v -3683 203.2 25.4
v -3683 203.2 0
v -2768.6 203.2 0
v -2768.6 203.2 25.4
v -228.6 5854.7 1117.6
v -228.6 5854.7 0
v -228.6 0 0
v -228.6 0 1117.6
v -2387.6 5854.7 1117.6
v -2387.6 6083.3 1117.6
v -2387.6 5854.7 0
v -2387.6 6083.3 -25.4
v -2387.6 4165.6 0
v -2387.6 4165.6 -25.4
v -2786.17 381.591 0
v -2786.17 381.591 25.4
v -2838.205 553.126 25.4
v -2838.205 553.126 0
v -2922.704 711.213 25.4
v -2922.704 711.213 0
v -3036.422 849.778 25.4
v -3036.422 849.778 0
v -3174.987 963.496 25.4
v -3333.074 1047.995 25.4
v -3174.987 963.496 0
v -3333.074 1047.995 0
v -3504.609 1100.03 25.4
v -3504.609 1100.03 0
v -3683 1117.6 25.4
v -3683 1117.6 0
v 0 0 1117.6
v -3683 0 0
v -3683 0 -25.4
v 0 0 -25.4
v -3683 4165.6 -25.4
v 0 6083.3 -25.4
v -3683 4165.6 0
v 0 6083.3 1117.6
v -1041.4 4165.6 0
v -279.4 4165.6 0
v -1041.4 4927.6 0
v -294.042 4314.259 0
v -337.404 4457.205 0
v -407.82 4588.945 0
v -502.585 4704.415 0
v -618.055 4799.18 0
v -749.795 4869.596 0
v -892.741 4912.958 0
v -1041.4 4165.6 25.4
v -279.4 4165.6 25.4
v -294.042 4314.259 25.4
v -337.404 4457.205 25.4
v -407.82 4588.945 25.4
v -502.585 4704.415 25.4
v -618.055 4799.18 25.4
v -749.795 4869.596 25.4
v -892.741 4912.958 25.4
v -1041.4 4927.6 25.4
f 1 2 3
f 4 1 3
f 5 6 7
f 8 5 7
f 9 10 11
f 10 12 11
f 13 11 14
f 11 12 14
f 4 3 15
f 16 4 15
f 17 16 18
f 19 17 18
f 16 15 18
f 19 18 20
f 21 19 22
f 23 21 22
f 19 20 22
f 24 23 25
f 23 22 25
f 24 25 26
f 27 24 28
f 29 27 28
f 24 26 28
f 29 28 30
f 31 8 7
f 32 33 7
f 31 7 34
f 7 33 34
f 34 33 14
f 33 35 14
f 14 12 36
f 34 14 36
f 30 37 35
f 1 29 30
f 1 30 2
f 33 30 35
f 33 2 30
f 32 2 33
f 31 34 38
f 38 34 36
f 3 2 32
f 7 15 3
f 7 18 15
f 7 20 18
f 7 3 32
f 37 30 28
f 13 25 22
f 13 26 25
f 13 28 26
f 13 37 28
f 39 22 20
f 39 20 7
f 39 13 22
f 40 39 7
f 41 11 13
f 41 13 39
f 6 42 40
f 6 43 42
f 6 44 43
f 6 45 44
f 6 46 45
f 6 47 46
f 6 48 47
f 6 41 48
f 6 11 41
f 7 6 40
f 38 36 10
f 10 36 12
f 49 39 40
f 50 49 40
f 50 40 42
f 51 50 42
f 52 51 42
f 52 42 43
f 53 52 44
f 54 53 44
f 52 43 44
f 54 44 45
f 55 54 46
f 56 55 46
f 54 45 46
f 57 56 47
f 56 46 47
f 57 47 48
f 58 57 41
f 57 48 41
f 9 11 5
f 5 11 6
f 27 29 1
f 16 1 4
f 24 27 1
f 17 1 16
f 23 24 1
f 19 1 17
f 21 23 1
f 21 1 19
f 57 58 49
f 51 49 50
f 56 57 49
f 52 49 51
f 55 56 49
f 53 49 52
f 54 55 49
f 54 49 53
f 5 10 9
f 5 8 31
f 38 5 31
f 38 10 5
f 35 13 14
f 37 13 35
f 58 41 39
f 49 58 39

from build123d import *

# Parameters (mm, degrees)
F0_W     = 228.6
F0_H     = 4165.6
F0_W_2   = 279.4
F0_H_2   = 1689.1
F1_DEPTH = 25.4
F2_DEPTH = 25.4
F3_DEPTH = 1117.6


# Not quite as in the source:
# - the program builds the solid bodies; features that only make, move or delete a surface that nothing else refers to are left out


with BuildPart() as f1:
    # F0 (on Top) → F1 (new body)
    with BuildSketch(Plane.XY):
        with BuildLine():
            Line((-3683, 0), (-228.6, 0))
            Line((-228.6, 0), (-228.6, 4165.6))
            Line((-228.6, 4165.6), (-279.4, 4165.6))
            Line((-279.4, 4165.6), (-1041.4, 4165.6))
            Line((-1041.4, 4165.6), (-2108.2, 4165.6))
            Line((-2108.2, 4165.6), (-2387.6, 4165.6))
            Line((-2387.6, 4165.6), (-3683, 4165.6))
            Line((-3683, 4165.6), (-3683, 1117.6))
            ThreePointArc((-3683, 1117.6), (-3036.421559283, 849.778440717), (-2768.6, 203.2))
            Line((-2768.6, 203.2), (-3683, 203.2))
            Line((-3683, 203.2), (-3683, 0))
        make_face()
        with BuildLine():
            Line((-3683, 1117.6), (-3683, 203.2))
            Line((-3683, 203.2), (-2768.6, 203.2))
            ThreePointArc((-2768.6, 203.2), (-3036.421559283, 849.778440717), (-3683, 1117.6))
        make_face()
        with Locations((-114.3, 2082.8)):
            Rectangle(F0_W, F0_H)
        Polygon((-228.6, 4165.6), (0, 4165.6), (0, 6083.3), (-228.6, 6083.3), (-228.6, 5854.7), align=None)
        with BuildLine():
            Line((-279.4, 4165.6), (-228.6, 4165.6))
            Line((-228.6, 4165.6), (-228.6, 5854.7))
            Line((-228.6, 5854.7), (-2108.2, 5854.7))
            Line((-2108.2, 5854.7), (-2108.2, 4165.6))
            Line((-2108.2, 4165.6), (-1041.4, 4165.6))
            Line((-1041.4, 4165.6), (-1041.4, 4927.6))
            ThreePointArc((-1041.4, 4927.6), (-502.5846327359, 4704.4153672641), (-279.4, 4165.6))
        make_face()
        with BuildLine():
            Line((-1041.4, 4165.6), (-279.4, 4165.6))
            ThreePointArc((-279.4, 4165.6), (-502.5846327359, 4704.4153672641), (-1041.4, 4927.6))
            Line((-1041.4, 4927.6), (-1041.4, 4165.6))
        make_face()
        Polygon((-2108.2, 5854.7), (-228.6, 5854.7), (-228.6, 6083.3), (-2387.6, 6083.3), (-2387.6, 5854.7), align=None)
        with Locations((-2247.9, 5010.15)):
            Rectangle(F0_W_2, F0_H_2)
    extrude(amount=-F1_DEPTH)

    # F0 (on Top) → F2 (join)
    with BuildSketch(Plane.XY):
        with BuildLine():
            Line((-3683, 1117.6), (-3683, 203.2))
            Line((-3683, 203.2), (-2768.6, 203.2))
            ThreePointArc((-2768.6, 203.2), (-3036.421559283, 849.778440717), (-3683, 1117.6))
        make_face()
        with BuildLine():
            Line((-1041.4, 4165.6), (-279.4, 4165.6))
            ThreePointArc((-279.4, 4165.6), (-502.5846327359, 4704.4153672641), (-1041.4, 4927.6))
            Line((-1041.4, 4927.6), (-1041.4, 4165.6))
        make_face()
    extrude(amount=F2_DEPTH)

    # F0 (on Top) → F3 (join)
    with BuildSketch(Plane.XY):
        Polygon((-228.6, 4165.6), (0, 4165.6), (0, 6083.3), (-228.6, 6083.3), (-228.6, 5854.7), align=None)
        with Locations((-114.3, 2082.8)):
            Rectangle(F0_W, F0_H)
        Polygon((-2108.2, 5854.7), (-228.6, 5854.7), (-228.6, 6083.3), (-2387.6, 6083.3), (-2387.6, 5854.7), align=None)
    extrude(amount=F3_DEPTH)


solid = f1.part
